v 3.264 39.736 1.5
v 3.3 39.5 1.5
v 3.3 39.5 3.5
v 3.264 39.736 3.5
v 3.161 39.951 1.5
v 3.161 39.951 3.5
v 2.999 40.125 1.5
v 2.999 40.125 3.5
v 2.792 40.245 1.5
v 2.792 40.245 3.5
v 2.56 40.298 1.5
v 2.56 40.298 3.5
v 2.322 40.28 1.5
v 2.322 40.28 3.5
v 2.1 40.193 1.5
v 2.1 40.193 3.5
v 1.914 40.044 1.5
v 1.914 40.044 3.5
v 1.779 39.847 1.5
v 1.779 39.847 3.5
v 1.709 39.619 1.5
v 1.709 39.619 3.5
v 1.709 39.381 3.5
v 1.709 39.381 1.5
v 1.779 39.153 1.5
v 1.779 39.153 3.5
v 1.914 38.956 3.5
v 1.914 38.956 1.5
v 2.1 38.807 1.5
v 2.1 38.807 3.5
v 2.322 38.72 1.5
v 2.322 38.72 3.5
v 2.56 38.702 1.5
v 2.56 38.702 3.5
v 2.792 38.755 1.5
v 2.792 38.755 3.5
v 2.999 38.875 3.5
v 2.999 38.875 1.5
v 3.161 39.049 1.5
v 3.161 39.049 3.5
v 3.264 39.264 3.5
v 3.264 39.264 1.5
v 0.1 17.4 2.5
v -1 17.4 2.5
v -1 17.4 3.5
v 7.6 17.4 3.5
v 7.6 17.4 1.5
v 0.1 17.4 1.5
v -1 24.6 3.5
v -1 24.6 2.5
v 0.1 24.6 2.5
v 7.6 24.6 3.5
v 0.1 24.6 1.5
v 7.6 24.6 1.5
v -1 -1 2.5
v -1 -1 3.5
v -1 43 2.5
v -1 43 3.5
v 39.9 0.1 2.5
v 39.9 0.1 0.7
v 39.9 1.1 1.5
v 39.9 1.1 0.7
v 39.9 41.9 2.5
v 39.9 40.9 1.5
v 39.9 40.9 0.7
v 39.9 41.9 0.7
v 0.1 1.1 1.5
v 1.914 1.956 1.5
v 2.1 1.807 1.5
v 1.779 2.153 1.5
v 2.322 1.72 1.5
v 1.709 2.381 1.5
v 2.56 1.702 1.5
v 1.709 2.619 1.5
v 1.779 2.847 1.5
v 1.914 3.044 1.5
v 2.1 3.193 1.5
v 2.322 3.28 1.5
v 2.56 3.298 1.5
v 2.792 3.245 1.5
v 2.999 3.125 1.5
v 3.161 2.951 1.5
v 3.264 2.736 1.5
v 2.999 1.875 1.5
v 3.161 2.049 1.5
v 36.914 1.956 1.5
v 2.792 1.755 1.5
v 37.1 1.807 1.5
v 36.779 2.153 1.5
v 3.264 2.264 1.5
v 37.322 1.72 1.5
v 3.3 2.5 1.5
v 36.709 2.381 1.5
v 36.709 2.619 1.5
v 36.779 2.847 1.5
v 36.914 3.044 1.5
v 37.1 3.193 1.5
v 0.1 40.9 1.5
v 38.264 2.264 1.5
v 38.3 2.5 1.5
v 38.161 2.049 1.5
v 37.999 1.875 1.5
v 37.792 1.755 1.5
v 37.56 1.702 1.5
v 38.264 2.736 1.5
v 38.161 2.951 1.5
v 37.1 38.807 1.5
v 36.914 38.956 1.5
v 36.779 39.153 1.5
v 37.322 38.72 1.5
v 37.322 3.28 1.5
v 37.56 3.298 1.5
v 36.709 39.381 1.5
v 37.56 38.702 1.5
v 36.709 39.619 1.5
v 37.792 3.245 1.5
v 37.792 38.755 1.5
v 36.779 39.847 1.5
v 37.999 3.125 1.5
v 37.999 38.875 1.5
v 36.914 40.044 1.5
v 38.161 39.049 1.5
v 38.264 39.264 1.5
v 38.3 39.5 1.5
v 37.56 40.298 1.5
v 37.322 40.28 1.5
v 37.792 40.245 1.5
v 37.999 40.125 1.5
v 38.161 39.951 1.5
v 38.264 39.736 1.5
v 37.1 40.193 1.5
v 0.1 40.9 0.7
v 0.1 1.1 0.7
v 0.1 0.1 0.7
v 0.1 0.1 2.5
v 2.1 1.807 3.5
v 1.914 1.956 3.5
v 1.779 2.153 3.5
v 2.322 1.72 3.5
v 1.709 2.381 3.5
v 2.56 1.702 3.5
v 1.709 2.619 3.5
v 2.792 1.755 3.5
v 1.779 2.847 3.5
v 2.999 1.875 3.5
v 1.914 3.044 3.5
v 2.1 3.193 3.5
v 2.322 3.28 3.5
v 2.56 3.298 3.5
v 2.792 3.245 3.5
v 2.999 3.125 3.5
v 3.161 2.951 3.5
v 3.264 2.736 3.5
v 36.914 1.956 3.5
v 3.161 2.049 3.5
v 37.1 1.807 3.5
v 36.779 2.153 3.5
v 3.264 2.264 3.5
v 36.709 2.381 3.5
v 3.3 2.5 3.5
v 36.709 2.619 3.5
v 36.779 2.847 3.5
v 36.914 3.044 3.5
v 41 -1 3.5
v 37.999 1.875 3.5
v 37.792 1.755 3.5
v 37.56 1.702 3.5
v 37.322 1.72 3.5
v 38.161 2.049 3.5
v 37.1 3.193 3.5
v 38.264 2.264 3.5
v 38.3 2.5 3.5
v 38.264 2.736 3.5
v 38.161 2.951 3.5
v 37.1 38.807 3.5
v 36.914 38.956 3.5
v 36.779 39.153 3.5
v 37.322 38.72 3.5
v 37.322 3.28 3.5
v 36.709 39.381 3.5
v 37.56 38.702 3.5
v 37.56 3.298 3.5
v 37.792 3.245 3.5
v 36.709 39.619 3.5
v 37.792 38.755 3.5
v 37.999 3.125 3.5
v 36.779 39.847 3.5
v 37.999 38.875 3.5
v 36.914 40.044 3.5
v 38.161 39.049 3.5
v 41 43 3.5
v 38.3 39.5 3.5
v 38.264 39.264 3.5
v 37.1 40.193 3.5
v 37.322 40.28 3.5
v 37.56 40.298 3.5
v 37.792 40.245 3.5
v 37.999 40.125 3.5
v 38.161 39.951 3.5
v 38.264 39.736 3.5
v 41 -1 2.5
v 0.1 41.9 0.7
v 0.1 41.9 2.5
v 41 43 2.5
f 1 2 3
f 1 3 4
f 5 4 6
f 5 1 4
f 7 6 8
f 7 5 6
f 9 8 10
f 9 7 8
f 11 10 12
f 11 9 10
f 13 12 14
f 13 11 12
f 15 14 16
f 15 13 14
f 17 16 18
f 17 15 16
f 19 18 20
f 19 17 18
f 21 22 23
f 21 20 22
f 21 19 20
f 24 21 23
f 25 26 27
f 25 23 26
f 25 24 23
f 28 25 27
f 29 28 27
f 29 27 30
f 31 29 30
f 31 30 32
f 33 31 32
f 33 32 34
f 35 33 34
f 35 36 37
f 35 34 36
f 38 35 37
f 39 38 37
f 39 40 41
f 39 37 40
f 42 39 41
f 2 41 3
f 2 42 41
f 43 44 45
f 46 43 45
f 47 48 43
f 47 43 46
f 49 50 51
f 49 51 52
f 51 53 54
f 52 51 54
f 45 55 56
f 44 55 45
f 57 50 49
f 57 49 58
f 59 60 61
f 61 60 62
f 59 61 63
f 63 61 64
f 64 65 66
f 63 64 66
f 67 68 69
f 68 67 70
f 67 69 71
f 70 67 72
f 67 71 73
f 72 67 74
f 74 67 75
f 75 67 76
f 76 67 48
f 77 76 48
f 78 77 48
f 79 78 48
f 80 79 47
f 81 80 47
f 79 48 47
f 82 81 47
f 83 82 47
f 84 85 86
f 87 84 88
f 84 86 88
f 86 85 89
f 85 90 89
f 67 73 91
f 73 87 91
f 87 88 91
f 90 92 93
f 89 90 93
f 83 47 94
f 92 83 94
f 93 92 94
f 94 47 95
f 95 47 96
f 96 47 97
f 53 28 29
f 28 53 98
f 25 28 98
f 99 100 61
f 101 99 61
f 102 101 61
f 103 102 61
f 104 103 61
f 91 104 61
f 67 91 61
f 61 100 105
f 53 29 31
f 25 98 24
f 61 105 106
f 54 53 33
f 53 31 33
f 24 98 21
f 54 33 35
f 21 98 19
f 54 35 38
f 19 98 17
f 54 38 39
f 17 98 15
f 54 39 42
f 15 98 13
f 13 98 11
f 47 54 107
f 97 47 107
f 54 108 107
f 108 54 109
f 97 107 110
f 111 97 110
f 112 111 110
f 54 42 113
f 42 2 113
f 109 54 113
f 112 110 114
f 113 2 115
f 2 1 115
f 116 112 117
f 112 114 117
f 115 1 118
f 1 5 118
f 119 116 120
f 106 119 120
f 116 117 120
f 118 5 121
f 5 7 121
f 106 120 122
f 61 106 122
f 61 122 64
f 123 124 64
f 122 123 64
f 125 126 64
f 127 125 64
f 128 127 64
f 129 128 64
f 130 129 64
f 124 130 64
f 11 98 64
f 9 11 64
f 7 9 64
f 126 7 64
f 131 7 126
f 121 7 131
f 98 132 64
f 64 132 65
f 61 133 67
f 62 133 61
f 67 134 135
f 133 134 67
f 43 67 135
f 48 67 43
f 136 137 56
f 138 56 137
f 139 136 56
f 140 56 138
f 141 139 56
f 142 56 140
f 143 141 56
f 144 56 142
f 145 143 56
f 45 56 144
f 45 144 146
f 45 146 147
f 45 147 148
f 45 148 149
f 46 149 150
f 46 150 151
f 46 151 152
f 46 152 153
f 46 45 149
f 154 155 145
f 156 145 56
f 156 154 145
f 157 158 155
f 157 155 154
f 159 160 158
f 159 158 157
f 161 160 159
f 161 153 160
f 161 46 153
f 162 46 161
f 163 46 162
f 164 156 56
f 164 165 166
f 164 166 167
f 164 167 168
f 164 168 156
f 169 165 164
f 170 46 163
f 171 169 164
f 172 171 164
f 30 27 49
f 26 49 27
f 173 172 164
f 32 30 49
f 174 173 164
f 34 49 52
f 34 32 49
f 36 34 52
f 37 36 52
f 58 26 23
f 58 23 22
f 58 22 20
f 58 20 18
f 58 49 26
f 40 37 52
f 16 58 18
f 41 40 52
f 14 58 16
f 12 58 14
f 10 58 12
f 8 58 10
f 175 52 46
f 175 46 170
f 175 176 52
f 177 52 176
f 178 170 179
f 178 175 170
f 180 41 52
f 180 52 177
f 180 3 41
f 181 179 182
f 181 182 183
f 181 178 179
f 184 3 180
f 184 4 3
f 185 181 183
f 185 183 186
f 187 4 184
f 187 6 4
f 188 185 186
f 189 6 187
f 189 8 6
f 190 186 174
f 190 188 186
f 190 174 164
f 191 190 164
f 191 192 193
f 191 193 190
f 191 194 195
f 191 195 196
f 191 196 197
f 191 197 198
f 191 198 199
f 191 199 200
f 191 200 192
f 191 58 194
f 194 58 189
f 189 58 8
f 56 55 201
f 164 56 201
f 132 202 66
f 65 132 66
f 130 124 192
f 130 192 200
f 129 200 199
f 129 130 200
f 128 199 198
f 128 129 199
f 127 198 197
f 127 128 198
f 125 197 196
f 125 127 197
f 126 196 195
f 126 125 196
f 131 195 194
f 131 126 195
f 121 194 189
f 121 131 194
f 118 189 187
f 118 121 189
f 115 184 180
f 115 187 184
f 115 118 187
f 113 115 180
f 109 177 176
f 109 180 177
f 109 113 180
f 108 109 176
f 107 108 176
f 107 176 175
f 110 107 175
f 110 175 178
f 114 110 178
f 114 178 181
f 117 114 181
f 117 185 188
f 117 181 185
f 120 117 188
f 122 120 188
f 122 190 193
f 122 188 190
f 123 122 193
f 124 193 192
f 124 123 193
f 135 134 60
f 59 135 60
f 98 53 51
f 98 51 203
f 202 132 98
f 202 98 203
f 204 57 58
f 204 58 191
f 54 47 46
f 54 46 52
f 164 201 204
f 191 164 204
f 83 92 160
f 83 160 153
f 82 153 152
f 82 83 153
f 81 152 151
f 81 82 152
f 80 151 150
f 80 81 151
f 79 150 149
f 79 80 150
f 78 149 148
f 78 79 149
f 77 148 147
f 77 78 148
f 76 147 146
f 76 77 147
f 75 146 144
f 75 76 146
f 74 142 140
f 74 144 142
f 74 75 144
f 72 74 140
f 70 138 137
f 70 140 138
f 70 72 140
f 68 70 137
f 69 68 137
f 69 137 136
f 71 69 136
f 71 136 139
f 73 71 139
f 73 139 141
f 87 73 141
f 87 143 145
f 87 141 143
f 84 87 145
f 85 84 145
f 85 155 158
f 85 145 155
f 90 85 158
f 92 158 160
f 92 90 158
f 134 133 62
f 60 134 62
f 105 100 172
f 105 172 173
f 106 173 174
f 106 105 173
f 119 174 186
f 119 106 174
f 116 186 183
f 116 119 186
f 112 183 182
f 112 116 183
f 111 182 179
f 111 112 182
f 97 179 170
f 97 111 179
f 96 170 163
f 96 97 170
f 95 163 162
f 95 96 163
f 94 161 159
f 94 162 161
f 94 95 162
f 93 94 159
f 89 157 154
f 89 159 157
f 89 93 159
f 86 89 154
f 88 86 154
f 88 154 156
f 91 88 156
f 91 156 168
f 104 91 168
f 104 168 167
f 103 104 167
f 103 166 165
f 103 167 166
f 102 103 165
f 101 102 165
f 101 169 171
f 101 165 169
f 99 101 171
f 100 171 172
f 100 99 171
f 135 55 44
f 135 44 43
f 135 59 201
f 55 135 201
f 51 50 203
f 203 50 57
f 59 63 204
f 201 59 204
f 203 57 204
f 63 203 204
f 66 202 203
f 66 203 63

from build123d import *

# Parameters (mm, degrees)
CYLINDER016_R     = 0.8
CYLINDER016_DEPTH = 20
CYLINDER017_R     = 0.8
CYLINDER017_DEPTH = 20
CYLINDER018_R     = 0.8
CYLINDER018_DEPTH = 20
CYLINDER019_R     = 0.8
CYLINDER019_DEPTH = 20
BOX010_W          = 39.8
BOX010_H          = 1
BOX010_DEPTH      = 0.8
BOX009_W          = 39.8
BOX009_H          = 1
BOX009_DEPTH      = 0.8
BOX007_W          = 20
BOX007_H          = 7.2
BOX007_DEPTH      = 10
BOX006_W          = 42
BOX006_H          = 44
BOX006_DEPTH      = 1
BOX005_W          = 39.8
BOX005_H          = 41.8
BOX005_DEPTH      = 1


with BuildPart() as zylinder016:
    # Cylinder016 → Cylinder016 (new body)
    with BuildSketch(Plane(origin=(37.5, 2.5, -10), x_dir=(1, 0, 0), z_dir=(0, 0, 1))):
        Circle(CYLINDER016_R)
    extrude(amount=CYLINDER016_DEPTH)


with BuildPart() as zylinder017:
    # Cylinder017 → Cylinder017 (new body)
    with BuildSketch(Plane(origin=(2.5, 2.5, -10), x_dir=(1, 0, 0), z_dir=(0, 0, 1))):
        Circle(CYLINDER017_R)
    extrude(amount=CYLINDER017_DEPTH)


with BuildPart() as zylinder018:
    # Cylinder018 → Cylinder018 (new body)
    with BuildSketch(Plane(origin=(37.5, 39.5, -10), x_dir=(1, 0, 0), z_dir=(0, 0, 1))):
        Circle(CYLINDER018_R)
    extrude(amount=CYLINDER018_DEPTH)


with BuildPart() as compound006:
    # Cylinder019 → Cylinder019 (new body)
    with BuildSketch(Plane(origin=(2.5, 39.5, -10), x_dir=(1, 0, 0), z_dir=(0, 0, 1))):
        Circle(CYLINDER019_R)
    extrude(amount=CYLINDER019_DEPTH)

    # Compound006: union Zylinder016, Zylinder017, Zylinder018
    add(zylinder016.part)
    add(zylinder017.part)
    add(zylinder018.part)


with BuildPart() as w_rfel010:
    # Box010 → Box010 (new body)
    with BuildSketch(Plane(origin=(0.1, 0.1, 0.7), x_dir=(1, 0, 0), z_dir=(0, 0, 1))):
        with Locations((19.9, 0.5)):
            Rectangle(BOX010_W, BOX010_H)
    extrude(amount=BOX010_DEPTH)


with BuildPart() as compound003:
    # Box009 → Box009 (new body)
    with BuildSketch(Plane(origin=(0.1, 40.9, 0.7), x_dir=(1, 0, 0), z_dir=(0, 0, 1))):
        with Locations((19.9, 0.5)):
            Rectangle(BOX009_W, BOX009_H)
    extrude(amount=BOX009_DEPTH)

    # Compound003: union Würfel010
    add(w_rfel010.part)


with BuildPart() as w_rfel007:
    # Box007 → Box007 (new body)
    with BuildSketch(Plane(origin=(-12.4, 17.4, 0), x_dir=(1, 0, 0), z_dir=(0, 0, 1))):
        with Locations((10, 3.6)):
            Rectangle(BOX007_W, BOX007_H)
    extrude(amount=BOX007_DEPTH)


with BuildPart() as w_rfel006:
    # Box006 → Box006 (new body)
    with BuildSketch(Plane(origin=(-1, -1, 2.5), x_dir=(1, 0, 0), z_dir=(0, 0, 1))):
        with Locations((21, 22)):
            Rectangle(BOX006_W, BOX006_H)
    extrude(amount=BOX006_DEPTH)


with BuildPart() as lowerpart:
    # Box005 → Box005 (new body)
    with BuildSketch(Plane(origin=(0.1, 0.1, 1.5), x_dir=(1, 0, 0), z_dir=(0, 0, 1))):
        with Locations((19.9, 20.9)):
            Rectangle(BOX005_W, BOX005_H)
    extrude(amount=BOX005_DEPTH)

    # Fusion001: union Würfel006
    add(w_rfel006.part)

    # Cut003: cut Würfel007
    add(w_rfel007.part, mode=Mode.SUBTRACT)

    # Fusion003: union Compound003
    add(compound003.part)

    # Cut008: cut Compound006
    add(compound006.part, mode=Mode.SUBTRACT)


solid = lowerpart.part
